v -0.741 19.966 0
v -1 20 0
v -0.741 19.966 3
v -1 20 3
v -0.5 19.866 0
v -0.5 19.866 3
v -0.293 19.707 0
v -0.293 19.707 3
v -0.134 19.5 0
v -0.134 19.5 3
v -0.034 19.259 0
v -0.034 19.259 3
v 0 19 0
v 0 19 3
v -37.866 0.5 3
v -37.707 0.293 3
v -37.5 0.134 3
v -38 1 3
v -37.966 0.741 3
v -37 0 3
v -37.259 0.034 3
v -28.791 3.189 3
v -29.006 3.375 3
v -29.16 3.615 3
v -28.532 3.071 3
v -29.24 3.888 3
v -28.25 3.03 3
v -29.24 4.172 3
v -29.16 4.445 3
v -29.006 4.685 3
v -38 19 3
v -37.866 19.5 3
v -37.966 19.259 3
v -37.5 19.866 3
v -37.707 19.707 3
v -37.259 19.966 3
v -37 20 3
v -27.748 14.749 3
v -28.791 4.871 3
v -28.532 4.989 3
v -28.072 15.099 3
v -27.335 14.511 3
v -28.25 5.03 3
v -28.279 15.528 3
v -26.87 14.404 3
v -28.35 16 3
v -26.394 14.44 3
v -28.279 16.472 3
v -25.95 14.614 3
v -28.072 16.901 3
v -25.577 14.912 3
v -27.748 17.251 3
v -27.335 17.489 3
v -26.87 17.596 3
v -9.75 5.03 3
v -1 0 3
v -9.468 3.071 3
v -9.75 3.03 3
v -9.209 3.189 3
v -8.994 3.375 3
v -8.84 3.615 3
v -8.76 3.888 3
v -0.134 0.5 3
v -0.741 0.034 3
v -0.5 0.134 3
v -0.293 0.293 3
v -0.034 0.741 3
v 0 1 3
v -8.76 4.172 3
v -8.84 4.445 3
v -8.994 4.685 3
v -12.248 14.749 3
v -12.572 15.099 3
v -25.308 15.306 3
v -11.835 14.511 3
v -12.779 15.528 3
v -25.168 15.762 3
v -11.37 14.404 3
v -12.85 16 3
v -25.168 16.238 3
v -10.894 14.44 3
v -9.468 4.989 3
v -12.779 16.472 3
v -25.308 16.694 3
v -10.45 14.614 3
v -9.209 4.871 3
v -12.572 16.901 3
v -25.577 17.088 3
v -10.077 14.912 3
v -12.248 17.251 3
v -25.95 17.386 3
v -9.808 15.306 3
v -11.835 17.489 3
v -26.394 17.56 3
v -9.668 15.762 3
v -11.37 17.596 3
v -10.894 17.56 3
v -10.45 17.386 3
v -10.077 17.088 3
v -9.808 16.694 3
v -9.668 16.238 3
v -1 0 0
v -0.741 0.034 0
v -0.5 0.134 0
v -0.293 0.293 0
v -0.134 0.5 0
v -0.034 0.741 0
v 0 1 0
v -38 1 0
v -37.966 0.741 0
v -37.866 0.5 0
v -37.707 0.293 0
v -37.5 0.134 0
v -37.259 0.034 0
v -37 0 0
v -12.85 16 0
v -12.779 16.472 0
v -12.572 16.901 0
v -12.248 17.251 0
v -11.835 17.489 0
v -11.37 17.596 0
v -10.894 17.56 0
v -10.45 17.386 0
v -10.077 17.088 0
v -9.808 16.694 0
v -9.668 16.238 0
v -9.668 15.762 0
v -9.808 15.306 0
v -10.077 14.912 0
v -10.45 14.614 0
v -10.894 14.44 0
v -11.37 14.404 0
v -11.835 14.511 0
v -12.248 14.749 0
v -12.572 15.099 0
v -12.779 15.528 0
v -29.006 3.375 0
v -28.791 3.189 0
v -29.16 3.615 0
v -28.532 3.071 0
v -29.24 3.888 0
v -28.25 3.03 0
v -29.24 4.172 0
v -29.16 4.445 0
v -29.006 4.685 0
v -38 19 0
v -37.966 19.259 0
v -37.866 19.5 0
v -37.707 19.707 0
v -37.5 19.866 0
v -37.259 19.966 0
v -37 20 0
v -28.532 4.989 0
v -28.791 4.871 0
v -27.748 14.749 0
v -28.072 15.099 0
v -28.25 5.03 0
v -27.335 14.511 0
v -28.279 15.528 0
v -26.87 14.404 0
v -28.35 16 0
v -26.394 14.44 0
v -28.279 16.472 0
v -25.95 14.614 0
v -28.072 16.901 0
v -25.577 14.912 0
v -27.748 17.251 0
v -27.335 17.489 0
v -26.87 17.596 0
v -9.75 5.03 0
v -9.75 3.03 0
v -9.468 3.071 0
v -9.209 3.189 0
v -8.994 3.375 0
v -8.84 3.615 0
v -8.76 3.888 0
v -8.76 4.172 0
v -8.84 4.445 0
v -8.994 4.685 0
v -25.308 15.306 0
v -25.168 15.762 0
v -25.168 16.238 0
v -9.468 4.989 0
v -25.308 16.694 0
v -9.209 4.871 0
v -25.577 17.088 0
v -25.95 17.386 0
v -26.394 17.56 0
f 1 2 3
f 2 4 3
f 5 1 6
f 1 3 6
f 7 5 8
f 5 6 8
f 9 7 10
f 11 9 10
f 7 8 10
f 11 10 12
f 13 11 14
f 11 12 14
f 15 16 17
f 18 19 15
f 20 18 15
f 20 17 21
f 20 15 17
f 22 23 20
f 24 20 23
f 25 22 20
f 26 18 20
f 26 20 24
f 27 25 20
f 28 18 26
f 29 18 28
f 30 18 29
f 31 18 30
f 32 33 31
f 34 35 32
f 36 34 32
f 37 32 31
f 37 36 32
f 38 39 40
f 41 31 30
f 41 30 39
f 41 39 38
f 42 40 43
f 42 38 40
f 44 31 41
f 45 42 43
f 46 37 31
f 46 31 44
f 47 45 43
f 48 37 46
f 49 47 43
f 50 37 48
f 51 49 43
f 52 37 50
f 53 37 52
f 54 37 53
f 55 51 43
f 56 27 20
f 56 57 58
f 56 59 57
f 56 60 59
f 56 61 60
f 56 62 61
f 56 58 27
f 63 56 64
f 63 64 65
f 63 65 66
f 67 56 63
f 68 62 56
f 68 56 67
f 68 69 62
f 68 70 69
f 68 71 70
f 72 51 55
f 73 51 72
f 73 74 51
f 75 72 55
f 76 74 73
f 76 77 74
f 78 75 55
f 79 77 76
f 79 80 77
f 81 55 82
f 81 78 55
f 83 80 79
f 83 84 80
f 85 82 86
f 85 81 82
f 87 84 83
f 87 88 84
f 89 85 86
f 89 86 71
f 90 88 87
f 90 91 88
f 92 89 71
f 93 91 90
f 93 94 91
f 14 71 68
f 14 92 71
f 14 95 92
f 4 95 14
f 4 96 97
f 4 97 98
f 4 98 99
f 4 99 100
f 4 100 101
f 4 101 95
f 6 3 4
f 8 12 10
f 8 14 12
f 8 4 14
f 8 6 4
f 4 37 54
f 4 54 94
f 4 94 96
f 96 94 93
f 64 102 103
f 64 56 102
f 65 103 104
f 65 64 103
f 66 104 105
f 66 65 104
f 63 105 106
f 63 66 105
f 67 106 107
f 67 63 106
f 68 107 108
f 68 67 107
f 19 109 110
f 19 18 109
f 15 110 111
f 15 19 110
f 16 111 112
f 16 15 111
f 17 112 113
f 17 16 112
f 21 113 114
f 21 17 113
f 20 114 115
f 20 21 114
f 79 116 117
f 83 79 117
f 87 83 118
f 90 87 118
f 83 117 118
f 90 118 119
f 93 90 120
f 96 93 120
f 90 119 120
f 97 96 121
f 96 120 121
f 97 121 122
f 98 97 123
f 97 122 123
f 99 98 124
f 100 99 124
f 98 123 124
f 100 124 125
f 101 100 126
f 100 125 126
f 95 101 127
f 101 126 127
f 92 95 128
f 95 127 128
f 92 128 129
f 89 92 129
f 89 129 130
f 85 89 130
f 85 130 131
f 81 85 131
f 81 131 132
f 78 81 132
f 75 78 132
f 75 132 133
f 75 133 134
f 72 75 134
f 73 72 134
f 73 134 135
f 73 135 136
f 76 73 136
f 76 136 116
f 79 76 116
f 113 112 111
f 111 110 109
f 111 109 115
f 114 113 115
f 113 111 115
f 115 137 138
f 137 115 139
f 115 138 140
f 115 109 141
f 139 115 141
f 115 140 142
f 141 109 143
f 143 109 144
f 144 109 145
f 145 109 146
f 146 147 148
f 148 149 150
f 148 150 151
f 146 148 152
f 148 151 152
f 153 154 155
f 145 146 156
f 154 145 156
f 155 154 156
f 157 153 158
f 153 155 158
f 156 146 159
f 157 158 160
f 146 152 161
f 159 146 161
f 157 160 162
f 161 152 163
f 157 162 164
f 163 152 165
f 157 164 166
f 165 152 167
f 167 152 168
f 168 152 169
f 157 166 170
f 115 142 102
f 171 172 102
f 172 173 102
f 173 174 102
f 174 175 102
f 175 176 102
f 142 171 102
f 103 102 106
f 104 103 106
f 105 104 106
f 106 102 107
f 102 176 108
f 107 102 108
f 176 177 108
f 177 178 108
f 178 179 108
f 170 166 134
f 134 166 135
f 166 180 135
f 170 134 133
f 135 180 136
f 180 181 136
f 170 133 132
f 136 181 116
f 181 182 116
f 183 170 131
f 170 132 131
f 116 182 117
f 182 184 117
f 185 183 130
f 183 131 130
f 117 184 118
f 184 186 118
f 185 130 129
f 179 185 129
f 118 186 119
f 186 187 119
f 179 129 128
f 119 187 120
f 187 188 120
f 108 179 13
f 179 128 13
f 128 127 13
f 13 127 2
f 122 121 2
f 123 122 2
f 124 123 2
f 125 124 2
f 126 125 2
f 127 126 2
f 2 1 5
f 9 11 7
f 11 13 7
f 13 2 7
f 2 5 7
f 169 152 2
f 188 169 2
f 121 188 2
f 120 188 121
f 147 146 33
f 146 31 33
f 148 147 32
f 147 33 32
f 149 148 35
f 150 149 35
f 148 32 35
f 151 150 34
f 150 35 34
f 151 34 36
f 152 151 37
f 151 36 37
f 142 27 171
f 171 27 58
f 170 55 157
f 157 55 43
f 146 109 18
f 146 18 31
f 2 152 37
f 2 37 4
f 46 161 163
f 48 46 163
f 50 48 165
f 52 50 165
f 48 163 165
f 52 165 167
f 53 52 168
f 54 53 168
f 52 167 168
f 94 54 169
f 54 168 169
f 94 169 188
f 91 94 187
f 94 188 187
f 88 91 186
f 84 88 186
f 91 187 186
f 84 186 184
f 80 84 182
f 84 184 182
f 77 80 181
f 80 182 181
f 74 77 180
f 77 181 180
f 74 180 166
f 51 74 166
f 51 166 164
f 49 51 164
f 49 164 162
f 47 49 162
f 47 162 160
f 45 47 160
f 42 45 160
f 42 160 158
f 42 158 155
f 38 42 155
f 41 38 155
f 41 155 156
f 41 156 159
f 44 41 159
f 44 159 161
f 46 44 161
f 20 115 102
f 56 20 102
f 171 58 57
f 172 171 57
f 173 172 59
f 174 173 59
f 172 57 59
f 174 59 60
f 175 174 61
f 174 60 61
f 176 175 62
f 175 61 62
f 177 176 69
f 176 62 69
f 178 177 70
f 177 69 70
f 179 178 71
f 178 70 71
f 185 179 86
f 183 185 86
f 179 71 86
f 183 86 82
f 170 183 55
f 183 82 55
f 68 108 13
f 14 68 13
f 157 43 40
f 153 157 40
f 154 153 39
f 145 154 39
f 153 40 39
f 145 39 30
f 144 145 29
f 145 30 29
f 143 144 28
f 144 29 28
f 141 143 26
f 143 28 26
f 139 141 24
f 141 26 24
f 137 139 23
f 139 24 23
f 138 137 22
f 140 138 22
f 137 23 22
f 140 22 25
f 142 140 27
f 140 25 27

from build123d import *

# Parameters (mm, degrees)
SKETCH1_W                = 38
SKETCH1_H                = 20
BOSS_EXTRUDE1_DEPTH      = 3
M3_CLEARANCE_HOLE1_D     = 3.2
M3_CLEARANCE_HOLE1_DEPTH = 20
M3_CLEARANCE_HOLE1_TIP   = 0.96137699
CUT_EXTRUDE1_DEPTH       = 3
FILLET1_R                = 1


with BuildPart() as part:
    # Sketch1 → Boss-Extrude1 (new body)
    with BuildSketch(Plane.XY):
        with Locations((-19, 10)):
            Rectangle(SKETCH1_W, SKETCH1_H)
    extrude(amount=BOSS_EXTRUDE1_DEPTH)

    # M3 Clearance Hole1
    with Locations(Plane.XY.offset(3)):
        with Locations((-11.25, 16), (-26.75, 16)):
            Hole(M3_CLEARANCE_HOLE1_D / 2, depth=M3_CLEARANCE_HOLE1_DEPTH)
            with Locations((0, 0, -(M3_CLEARANCE_HOLE1_DEPTH + M3_CLEARANCE_HOLE1_TIP / 2))):  # 118° drill point
                Cone(0, M3_CLEARANCE_HOLE1_D / 2, M3_CLEARANCE_HOLE1_TIP, mode=Mode.SUBTRACT)

    # Sketch4 → Cut-Extrude1 (cut)
    with BuildSketch(Plane.XY.offset(3)):
        with BuildLine():
            Line((-9.75, 5.03), (-28.25, 5.03))
            ThreePointArc((-28.25, 5.03), (-29.25, 4.03), (-28.25, 3.03))
            Line((-28.25, 3.03), (-9.75, 3.03))
            ThreePointArc((-9.75, 3.03), (-8.75, 4.03), (-9.75, 5.03))
        make_face()
    extrude(amount=-CUT_EXTRUDE1_DEPTH, mode=Mode.SUBTRACT)

    # Fillet1
    fillet1_edges = [part.edges().sort_by_distance(p)[0] for p in [
        (0, 0, 1.5),
        (-38, 0, 1.5),
        (-38, 20, 1.5),
        (0, 20, 1.5),
    ]]
    fillet(fillet1_edges, radius=FILLET1_R)


solid = part.part
